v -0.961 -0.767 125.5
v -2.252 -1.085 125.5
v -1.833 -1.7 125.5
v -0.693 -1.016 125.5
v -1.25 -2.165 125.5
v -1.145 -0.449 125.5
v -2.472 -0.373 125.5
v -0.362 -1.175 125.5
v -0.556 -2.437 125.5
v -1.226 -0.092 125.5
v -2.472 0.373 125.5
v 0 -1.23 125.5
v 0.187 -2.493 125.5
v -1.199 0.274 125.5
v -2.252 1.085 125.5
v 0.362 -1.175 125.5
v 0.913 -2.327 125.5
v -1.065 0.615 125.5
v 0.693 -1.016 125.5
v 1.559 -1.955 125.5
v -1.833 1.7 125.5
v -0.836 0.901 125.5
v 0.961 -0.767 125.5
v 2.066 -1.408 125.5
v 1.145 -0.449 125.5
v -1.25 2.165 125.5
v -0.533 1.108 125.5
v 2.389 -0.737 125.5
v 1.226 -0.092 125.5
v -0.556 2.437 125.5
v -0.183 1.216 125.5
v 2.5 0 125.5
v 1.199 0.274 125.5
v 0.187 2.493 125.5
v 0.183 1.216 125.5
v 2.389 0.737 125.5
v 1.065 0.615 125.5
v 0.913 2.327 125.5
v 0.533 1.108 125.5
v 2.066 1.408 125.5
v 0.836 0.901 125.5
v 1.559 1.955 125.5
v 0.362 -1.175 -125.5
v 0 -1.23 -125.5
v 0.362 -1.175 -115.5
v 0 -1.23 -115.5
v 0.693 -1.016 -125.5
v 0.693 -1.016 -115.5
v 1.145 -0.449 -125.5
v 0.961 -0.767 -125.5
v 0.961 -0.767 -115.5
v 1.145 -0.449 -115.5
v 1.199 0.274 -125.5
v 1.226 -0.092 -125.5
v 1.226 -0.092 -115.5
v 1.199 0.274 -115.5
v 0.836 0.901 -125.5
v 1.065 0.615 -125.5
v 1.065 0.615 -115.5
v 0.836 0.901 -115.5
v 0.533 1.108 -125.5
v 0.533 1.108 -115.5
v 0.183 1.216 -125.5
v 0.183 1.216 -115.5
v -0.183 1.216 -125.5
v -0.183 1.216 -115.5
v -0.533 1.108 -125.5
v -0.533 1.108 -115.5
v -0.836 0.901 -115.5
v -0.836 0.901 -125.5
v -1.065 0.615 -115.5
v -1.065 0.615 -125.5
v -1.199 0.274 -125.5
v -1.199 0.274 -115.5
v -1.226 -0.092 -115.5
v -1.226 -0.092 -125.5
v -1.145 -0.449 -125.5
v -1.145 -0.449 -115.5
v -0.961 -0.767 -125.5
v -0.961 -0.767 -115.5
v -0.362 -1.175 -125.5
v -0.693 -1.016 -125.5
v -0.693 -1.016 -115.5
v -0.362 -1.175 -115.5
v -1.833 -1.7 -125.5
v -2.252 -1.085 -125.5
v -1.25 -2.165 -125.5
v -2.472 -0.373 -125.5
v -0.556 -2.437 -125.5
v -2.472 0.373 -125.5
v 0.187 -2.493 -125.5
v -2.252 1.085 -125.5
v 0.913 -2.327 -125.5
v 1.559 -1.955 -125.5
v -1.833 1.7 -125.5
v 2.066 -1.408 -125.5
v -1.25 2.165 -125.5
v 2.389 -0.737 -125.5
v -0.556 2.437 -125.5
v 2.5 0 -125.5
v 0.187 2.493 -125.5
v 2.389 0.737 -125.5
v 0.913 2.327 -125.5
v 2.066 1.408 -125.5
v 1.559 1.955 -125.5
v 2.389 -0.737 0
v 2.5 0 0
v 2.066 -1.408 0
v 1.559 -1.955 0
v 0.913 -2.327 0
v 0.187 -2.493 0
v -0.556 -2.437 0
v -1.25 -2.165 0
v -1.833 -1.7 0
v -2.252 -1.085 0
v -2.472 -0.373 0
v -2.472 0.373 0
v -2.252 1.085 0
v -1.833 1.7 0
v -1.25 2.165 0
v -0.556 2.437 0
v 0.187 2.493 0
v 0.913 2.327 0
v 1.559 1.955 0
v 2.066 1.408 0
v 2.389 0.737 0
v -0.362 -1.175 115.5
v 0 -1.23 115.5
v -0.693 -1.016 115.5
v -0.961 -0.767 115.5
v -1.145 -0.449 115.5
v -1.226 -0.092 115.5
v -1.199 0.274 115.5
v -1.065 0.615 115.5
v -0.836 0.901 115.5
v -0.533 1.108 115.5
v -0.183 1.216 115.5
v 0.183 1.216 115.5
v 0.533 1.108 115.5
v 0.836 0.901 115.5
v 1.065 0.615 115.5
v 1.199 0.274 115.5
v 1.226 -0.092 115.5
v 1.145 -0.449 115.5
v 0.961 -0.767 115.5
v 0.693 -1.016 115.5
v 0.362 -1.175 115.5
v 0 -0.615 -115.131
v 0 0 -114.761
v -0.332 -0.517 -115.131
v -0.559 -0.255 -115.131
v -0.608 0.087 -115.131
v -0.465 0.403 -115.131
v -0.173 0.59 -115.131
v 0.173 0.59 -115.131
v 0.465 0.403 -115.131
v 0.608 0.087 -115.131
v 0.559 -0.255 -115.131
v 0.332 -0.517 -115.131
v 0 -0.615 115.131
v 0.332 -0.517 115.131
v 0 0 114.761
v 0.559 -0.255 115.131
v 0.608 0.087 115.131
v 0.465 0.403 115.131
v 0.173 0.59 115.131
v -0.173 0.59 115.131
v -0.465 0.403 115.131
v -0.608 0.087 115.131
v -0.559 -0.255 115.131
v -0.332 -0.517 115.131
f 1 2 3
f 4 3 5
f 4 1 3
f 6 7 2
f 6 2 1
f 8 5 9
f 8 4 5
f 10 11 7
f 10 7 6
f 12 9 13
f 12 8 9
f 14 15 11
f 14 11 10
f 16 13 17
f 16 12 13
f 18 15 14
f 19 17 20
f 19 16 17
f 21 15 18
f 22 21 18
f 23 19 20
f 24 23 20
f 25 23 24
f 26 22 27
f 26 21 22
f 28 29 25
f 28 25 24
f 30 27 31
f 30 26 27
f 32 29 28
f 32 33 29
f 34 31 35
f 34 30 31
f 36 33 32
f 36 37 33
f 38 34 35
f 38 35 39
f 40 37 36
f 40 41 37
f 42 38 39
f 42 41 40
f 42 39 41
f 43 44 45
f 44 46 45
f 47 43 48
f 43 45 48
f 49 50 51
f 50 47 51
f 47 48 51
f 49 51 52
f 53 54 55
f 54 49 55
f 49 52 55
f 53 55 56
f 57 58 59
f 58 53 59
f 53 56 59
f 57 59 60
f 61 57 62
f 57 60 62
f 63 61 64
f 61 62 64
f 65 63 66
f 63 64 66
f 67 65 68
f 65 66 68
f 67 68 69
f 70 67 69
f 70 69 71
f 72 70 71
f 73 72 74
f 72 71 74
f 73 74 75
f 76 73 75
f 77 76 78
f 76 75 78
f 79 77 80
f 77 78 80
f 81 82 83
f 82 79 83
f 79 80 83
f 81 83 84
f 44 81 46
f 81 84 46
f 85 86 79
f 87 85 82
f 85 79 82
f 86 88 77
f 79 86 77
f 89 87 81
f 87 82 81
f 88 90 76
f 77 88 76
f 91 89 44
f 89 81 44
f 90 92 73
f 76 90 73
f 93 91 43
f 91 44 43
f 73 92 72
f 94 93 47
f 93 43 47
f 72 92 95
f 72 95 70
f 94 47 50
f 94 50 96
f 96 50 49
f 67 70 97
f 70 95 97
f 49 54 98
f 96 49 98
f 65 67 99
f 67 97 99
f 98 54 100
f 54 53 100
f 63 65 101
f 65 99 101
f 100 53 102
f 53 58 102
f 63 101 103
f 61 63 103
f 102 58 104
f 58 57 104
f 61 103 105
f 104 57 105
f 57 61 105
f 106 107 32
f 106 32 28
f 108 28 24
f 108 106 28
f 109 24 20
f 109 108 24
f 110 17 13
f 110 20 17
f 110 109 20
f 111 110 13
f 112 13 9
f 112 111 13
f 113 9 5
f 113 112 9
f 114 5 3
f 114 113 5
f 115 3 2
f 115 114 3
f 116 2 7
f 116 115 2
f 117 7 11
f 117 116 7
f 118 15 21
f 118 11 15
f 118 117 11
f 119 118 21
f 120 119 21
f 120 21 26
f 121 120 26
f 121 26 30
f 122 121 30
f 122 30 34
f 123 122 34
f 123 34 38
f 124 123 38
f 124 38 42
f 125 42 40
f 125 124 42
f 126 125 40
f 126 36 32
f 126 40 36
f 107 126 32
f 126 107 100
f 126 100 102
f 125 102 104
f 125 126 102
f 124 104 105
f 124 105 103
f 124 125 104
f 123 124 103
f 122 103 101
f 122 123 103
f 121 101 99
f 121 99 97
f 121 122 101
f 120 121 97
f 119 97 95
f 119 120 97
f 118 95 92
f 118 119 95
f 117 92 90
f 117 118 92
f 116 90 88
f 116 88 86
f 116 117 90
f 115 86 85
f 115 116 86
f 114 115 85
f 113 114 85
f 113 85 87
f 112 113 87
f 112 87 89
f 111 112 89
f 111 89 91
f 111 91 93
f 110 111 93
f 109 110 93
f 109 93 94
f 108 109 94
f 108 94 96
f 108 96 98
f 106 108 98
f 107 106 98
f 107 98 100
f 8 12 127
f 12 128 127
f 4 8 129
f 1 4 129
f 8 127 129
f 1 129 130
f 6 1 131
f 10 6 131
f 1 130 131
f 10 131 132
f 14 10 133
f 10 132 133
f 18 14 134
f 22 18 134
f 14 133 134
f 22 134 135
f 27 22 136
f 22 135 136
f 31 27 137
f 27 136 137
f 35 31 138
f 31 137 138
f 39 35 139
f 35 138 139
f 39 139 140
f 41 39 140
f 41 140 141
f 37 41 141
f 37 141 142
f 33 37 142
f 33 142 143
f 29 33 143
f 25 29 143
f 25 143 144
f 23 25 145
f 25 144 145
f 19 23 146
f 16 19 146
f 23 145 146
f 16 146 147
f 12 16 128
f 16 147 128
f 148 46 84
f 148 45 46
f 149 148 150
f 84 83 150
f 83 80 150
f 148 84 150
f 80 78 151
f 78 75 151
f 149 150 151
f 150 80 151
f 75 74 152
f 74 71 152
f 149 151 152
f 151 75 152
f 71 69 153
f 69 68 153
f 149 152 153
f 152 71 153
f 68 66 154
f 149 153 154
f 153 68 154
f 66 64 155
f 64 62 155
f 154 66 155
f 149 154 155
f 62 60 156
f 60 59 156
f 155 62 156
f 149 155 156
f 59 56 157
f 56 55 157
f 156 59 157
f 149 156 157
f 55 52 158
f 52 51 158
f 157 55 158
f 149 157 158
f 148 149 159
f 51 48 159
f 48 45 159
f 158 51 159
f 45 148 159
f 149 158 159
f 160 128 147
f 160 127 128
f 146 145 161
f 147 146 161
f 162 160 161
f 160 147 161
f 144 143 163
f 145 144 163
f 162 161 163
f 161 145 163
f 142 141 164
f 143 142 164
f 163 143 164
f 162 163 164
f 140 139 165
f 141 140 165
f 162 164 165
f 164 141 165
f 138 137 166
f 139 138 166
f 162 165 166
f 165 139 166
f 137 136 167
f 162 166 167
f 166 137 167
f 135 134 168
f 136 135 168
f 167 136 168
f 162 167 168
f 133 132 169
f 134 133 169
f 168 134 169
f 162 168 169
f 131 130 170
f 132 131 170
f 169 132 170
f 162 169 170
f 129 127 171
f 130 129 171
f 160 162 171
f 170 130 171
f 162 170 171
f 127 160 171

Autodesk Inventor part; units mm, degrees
ref_plane "YZ Plane" through (0, 0, 0) normal (1, 0, 0) x (0, 1, 0)
ref_plane "XZ Plane" through (0, 0, 0) normal (0, 1, 0) x (-1, 0, 0)
ref_plane "XY Plane" through (0, 0, 0) normal (0, 0, 1) x (1, 0, 0)
sketch "Náčrt1" plane through (0, 0, 0) normal (0, 0, 1) x (1, 0, 0)
  circle A0 centre (0, 0) radius 2.5
  dimension "d0" = 5
extrude "Vysunutí1" add sketch "Náčrt1" along normal mid plane 251
sketch "Náčrt2" plane through (0, 0, 125.5) normal (0, 0, 1) x (1, 0, 0)
  point P0 (0, 0)
  point P1 (0, 0)
hole "Díra1" at (0, 0, 125.5) direction (0, 0, -1) diameter 2.459 depth 10 tip angle 118 thread size "M3x0.5" class "6H" standard "ISO Metric profile"
mirror "Zrcadlit1" about plane through (0, 0, 0) normal (0, 0, 1) of "Díra1"
properties part number "lifter_rod" material "Hliník 6061"
